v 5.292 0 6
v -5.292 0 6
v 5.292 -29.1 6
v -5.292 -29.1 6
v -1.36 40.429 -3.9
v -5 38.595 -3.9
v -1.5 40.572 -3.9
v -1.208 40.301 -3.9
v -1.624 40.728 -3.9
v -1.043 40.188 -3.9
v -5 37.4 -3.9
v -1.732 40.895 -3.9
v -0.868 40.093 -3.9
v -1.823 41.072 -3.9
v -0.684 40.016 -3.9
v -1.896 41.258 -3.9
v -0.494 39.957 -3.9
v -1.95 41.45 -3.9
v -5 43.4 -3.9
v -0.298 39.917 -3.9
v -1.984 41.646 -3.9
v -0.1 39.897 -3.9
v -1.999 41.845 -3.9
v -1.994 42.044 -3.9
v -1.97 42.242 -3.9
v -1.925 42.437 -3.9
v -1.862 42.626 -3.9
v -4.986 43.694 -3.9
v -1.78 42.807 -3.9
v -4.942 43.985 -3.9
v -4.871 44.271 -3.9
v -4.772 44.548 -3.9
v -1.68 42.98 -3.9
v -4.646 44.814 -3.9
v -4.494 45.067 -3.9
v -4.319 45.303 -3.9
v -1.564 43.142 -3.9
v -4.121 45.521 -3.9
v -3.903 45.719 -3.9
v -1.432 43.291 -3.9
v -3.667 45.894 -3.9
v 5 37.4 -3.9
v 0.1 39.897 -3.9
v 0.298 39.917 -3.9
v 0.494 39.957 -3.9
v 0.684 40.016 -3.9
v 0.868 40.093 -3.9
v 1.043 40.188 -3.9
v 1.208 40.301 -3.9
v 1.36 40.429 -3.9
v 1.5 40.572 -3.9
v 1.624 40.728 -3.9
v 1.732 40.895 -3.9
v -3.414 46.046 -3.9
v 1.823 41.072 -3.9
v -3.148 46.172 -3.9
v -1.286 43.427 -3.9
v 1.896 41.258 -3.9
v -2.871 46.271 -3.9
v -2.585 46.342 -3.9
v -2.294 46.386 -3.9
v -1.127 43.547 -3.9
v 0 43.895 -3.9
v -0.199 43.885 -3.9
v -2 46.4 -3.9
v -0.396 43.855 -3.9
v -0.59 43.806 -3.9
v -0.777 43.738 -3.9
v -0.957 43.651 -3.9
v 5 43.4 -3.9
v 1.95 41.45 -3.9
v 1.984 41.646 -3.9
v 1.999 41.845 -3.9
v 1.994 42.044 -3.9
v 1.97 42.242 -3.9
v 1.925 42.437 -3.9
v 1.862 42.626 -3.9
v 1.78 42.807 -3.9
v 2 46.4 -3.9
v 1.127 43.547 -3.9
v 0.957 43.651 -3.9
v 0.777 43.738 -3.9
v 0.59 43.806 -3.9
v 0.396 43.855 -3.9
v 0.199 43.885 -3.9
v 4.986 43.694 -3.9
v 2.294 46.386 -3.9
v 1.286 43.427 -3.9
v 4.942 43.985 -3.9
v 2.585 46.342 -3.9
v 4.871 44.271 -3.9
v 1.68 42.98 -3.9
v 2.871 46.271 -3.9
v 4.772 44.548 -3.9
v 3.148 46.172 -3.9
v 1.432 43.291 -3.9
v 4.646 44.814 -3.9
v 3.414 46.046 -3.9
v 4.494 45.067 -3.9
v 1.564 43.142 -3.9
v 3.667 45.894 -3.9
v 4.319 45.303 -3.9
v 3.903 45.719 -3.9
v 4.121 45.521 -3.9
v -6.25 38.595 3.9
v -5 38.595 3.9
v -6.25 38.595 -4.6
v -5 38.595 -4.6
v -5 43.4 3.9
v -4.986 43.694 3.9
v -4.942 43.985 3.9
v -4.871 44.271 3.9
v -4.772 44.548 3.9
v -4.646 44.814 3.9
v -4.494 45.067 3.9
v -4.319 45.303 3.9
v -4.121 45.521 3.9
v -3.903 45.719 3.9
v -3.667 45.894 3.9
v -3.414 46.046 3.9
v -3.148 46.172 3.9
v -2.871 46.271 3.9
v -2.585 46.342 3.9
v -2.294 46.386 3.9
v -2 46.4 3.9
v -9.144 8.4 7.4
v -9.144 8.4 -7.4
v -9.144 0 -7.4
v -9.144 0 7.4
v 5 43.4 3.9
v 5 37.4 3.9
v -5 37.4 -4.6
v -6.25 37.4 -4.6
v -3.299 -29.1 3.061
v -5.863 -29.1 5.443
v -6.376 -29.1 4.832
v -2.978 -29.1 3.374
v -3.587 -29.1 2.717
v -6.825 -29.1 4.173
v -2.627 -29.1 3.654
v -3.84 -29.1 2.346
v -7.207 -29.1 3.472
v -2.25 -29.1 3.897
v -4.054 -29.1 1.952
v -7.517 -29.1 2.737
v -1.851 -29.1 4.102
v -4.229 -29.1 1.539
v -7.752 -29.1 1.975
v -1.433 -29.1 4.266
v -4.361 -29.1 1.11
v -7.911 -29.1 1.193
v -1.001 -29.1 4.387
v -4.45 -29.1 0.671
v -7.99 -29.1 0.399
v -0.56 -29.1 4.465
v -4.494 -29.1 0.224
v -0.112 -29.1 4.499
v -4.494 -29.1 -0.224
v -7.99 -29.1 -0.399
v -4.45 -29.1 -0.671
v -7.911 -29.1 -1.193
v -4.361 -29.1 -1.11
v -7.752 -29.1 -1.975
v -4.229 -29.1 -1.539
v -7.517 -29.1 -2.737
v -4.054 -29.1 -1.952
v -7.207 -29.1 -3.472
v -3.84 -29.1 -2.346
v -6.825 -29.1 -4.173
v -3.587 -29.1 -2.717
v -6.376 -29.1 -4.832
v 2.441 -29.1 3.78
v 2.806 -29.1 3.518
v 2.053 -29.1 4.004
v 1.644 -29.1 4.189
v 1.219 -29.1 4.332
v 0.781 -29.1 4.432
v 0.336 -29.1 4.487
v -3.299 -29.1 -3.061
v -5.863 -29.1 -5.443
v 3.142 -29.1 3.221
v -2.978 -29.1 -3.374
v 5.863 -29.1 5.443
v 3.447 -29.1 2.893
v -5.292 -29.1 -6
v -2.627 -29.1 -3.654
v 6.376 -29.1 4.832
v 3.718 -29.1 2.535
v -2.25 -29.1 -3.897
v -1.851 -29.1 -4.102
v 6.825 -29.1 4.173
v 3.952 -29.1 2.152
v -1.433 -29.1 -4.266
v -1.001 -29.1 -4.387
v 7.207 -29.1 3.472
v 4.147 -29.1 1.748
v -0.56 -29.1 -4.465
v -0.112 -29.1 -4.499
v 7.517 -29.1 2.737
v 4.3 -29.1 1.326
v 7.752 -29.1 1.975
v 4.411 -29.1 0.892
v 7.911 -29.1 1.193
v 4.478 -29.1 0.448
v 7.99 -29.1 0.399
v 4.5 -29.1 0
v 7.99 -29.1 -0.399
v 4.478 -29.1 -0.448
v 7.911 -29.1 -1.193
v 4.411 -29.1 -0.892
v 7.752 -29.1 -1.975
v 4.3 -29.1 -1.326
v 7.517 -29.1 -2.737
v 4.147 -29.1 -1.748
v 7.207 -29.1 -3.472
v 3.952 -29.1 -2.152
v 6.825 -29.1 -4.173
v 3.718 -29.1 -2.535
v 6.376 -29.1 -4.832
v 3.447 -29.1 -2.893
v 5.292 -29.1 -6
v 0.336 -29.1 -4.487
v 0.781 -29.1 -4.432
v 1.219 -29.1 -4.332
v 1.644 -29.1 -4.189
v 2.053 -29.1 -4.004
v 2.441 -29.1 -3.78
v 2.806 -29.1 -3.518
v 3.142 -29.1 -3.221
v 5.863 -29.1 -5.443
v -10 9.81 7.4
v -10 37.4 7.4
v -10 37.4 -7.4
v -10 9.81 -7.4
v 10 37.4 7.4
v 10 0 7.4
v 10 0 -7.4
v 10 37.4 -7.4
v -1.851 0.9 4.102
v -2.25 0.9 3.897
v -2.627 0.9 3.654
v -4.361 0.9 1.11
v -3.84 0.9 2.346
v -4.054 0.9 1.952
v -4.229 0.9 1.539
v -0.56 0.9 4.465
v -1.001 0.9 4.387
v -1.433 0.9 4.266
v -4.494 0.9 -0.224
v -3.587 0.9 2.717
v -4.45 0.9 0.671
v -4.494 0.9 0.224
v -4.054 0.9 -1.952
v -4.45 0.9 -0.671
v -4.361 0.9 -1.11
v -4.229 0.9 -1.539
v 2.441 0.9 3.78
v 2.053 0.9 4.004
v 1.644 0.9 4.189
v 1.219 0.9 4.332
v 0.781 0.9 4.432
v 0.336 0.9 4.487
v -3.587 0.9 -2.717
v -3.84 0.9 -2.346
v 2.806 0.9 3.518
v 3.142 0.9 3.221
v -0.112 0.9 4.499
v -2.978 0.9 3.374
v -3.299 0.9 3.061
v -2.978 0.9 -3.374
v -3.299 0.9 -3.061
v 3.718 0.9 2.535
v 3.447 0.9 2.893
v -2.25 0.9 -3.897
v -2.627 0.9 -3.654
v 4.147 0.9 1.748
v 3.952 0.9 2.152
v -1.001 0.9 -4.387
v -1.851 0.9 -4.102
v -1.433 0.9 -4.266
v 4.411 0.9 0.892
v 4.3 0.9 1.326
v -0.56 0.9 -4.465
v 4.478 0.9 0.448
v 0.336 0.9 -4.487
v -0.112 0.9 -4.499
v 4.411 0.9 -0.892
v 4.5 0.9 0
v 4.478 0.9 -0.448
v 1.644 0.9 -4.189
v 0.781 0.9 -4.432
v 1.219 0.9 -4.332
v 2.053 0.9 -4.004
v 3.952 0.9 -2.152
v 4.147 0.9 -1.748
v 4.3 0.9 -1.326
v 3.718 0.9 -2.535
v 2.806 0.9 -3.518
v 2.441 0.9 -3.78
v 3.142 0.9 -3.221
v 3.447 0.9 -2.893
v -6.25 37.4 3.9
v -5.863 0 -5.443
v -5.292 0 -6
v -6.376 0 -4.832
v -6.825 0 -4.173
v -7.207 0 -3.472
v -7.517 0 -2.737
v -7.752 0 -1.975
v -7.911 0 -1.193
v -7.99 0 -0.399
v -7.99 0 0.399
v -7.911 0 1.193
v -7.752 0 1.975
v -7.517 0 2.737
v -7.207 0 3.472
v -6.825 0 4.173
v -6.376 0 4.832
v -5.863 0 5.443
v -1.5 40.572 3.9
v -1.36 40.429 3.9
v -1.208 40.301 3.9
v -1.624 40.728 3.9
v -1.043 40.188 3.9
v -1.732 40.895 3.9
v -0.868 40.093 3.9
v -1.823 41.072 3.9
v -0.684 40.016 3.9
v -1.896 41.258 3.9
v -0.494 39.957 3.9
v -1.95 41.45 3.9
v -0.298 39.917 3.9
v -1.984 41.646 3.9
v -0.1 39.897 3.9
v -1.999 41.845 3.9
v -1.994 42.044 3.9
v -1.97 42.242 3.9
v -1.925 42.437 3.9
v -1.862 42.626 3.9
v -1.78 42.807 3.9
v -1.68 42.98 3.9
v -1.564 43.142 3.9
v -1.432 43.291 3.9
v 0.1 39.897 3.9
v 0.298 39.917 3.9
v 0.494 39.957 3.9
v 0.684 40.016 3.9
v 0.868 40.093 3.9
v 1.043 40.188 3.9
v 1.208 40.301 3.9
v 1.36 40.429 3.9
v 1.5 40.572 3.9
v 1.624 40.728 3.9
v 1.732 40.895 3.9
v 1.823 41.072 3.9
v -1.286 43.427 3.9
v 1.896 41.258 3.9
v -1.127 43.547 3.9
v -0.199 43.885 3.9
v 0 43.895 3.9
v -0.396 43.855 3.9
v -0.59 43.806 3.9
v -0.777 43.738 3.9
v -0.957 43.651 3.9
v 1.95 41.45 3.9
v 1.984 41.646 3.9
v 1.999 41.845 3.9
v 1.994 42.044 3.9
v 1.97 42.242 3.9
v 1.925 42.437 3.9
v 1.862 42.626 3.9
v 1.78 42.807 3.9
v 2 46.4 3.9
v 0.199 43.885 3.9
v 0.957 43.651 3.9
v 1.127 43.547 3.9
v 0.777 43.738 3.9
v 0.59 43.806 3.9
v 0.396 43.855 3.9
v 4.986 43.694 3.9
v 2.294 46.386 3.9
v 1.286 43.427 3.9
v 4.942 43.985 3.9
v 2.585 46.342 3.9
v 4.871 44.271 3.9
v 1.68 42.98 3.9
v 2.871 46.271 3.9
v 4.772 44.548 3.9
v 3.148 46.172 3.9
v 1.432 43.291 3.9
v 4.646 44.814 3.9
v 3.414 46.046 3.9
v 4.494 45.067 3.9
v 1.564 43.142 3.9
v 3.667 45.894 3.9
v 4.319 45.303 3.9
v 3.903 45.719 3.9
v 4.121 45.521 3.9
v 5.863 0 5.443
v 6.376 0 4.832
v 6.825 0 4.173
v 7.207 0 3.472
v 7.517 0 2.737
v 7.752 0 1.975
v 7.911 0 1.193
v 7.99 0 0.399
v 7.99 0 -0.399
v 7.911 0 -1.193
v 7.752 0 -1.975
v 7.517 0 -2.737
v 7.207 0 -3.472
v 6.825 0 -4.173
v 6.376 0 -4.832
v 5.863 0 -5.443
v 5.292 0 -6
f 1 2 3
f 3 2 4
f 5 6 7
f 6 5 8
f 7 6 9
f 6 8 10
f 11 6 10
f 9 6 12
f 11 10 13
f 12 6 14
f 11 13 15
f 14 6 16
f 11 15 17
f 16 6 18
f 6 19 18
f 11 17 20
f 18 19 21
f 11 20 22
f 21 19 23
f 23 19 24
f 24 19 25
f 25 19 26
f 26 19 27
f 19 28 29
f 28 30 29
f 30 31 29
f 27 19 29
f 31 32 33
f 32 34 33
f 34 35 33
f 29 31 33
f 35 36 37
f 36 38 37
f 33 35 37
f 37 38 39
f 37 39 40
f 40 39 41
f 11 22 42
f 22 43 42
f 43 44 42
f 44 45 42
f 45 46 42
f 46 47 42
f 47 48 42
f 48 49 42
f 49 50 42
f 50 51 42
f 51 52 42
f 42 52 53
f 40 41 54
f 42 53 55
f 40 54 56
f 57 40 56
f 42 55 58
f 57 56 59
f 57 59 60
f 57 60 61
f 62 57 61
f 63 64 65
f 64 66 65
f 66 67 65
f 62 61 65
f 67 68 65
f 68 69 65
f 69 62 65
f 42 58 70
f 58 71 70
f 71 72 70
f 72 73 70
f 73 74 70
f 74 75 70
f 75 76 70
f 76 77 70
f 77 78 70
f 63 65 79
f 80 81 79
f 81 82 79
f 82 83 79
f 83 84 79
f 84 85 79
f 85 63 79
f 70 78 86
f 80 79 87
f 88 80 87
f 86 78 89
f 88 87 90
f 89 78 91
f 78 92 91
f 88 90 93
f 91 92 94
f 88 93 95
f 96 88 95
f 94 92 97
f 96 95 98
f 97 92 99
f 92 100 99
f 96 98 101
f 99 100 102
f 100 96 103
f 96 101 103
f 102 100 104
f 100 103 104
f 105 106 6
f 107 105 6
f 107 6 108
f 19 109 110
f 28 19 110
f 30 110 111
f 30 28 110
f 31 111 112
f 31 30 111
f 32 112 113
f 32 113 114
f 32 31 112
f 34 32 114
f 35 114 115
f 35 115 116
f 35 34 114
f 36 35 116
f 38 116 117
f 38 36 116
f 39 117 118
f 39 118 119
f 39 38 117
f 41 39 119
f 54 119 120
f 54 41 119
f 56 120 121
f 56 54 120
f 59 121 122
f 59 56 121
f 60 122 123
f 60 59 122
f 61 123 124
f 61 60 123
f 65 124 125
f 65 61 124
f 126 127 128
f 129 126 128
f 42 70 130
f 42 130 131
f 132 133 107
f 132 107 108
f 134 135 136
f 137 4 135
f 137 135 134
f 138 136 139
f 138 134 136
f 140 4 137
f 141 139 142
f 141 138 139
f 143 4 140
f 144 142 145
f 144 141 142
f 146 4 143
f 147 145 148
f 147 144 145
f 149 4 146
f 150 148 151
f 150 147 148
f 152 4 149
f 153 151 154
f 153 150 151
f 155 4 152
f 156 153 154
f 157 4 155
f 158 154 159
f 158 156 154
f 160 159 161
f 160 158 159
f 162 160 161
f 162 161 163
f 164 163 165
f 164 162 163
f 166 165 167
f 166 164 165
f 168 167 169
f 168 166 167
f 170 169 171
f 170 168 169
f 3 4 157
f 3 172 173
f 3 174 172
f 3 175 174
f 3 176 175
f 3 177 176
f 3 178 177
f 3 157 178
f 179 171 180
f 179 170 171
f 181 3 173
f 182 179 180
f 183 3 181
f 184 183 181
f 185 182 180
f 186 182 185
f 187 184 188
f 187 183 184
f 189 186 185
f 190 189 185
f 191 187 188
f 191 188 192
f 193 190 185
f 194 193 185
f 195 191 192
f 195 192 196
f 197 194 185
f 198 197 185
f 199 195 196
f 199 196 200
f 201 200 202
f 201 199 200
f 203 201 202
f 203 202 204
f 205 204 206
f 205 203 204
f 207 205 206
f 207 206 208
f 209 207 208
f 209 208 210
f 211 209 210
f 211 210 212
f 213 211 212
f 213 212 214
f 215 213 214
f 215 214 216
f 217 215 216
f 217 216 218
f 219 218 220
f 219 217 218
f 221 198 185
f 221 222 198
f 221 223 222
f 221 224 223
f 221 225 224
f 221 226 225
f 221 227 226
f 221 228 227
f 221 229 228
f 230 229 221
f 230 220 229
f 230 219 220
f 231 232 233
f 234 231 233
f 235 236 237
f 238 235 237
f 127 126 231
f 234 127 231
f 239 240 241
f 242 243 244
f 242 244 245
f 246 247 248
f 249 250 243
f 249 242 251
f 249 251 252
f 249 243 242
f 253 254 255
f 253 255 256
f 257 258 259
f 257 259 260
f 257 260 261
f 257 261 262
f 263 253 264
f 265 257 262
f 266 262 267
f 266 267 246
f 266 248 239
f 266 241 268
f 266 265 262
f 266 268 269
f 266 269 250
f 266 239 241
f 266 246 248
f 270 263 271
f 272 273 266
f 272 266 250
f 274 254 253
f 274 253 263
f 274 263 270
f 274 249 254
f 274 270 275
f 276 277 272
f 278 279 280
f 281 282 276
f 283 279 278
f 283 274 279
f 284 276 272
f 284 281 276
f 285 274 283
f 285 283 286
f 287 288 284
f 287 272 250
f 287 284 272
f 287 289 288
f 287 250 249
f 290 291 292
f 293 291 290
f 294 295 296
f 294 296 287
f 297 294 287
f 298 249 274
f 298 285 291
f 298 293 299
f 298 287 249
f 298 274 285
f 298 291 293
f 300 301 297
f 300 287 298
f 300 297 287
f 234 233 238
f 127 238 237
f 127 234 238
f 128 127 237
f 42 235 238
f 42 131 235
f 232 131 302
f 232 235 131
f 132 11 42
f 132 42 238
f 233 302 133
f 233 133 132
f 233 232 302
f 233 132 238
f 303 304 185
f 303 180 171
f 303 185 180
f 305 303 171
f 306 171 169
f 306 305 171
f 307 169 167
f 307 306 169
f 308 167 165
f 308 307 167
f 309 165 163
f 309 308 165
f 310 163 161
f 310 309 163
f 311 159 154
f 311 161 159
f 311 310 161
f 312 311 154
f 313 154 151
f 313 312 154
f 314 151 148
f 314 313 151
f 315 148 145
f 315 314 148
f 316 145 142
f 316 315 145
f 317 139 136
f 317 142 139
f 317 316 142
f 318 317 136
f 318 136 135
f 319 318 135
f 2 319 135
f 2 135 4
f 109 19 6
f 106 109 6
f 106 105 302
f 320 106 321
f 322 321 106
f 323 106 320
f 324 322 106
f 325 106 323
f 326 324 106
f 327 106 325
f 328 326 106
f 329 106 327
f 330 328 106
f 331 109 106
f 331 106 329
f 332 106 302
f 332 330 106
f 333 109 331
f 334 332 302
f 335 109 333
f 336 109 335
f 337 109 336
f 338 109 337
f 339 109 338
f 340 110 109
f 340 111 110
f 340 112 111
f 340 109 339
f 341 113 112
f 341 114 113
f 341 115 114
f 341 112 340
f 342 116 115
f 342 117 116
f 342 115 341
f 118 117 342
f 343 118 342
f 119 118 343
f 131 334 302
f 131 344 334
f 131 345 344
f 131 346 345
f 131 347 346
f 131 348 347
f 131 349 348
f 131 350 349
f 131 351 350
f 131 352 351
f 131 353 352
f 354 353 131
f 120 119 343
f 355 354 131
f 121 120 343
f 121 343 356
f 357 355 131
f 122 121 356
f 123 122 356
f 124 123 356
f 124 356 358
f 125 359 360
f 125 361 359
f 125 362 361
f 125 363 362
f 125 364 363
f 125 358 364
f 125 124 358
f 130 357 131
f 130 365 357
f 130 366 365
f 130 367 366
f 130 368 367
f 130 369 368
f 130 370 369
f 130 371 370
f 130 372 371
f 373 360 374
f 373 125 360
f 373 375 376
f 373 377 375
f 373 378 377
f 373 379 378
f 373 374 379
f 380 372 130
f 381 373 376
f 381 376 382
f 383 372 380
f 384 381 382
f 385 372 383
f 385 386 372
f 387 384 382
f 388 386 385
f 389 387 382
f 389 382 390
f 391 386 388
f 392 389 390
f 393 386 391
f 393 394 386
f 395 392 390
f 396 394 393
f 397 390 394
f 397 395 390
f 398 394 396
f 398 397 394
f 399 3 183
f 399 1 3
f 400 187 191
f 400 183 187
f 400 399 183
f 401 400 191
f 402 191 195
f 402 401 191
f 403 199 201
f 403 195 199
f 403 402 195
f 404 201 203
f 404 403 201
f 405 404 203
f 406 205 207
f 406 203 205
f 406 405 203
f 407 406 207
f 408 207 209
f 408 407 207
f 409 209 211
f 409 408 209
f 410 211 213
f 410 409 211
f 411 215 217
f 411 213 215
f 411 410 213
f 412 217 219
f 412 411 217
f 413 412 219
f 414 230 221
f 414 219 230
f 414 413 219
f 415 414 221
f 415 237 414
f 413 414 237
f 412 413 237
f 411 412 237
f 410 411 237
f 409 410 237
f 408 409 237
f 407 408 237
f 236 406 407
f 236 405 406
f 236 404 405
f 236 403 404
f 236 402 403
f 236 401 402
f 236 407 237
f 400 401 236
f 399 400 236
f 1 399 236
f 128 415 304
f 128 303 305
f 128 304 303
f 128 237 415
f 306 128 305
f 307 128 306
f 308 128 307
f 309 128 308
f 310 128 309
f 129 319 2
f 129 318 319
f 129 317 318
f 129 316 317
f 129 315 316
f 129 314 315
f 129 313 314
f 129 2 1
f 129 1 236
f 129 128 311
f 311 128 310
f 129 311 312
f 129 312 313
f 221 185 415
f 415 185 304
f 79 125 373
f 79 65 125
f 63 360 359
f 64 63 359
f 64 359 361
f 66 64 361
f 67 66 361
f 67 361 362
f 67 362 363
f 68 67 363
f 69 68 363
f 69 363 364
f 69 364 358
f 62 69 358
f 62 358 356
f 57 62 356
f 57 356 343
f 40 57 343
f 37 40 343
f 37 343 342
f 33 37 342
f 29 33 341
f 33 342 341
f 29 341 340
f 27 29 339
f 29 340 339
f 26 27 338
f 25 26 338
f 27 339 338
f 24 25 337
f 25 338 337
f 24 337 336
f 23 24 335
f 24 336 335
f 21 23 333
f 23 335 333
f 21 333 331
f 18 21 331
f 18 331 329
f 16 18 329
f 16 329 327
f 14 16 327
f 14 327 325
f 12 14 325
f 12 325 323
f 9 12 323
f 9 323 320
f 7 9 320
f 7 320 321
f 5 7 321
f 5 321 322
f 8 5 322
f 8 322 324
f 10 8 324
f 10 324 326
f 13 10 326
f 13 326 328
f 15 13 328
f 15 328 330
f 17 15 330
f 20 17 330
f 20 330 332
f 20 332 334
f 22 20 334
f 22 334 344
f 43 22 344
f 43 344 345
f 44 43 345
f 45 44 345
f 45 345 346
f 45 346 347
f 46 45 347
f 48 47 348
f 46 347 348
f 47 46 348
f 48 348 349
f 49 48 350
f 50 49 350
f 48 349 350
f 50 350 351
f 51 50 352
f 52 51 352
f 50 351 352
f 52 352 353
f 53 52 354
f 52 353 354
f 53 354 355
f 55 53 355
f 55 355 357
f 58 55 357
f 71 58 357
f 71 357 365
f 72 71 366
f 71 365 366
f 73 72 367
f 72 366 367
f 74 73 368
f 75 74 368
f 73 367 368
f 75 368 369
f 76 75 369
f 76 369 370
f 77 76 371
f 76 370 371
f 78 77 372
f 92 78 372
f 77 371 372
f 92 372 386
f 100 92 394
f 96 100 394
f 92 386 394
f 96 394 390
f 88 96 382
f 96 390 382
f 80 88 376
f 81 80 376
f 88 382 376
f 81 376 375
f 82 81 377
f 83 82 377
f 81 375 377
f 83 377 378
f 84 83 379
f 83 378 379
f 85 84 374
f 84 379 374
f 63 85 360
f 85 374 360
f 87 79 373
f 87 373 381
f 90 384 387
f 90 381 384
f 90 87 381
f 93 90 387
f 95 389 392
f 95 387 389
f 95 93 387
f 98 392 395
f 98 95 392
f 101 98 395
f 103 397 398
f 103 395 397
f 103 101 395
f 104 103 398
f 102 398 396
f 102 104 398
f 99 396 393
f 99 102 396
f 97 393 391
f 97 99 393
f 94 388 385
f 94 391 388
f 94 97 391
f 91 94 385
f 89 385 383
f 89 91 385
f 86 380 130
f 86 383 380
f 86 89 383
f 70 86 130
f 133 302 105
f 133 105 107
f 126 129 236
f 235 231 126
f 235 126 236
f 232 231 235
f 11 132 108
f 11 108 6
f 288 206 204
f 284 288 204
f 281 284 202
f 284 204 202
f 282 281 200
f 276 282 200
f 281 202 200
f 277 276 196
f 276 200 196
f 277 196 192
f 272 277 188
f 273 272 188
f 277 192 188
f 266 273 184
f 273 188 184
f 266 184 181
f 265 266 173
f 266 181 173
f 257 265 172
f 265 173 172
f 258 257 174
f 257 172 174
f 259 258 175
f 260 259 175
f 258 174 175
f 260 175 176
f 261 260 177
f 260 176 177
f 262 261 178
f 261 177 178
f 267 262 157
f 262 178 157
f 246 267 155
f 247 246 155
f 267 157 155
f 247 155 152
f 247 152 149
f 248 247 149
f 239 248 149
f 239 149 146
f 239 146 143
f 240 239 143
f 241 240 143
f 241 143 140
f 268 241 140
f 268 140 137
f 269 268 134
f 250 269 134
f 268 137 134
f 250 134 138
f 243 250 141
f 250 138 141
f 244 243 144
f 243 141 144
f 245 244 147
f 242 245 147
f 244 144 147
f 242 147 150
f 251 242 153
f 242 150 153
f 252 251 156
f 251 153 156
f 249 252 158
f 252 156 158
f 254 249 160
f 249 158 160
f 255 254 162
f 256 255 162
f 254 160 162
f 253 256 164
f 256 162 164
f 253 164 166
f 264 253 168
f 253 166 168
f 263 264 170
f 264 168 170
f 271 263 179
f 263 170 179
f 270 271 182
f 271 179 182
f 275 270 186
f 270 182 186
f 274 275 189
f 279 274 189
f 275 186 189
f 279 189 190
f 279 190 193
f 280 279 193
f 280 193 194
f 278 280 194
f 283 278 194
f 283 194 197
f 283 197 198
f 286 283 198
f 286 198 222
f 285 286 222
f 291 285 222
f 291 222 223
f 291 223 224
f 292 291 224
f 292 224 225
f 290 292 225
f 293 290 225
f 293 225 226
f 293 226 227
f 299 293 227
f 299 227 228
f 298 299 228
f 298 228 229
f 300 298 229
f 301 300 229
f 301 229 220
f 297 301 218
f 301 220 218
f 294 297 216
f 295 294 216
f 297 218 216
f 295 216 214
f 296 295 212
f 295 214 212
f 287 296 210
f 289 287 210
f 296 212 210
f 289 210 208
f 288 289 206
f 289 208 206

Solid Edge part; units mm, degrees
sketch "Sketch1" plane through (0, 0, 0) normal (1, 0, 0) x (0, 1, 0)
  line L0 (0, 7.4) -> (37.4, 7.4)
  line L1 (37.4, 7.4) -> (37.4, -7.4)
  line L2 (37.4, -7.4) -> (0, -7.4)
  line L3 (0, -7.4) -> (0, 7.4)
  dimension "D1" = 37.4
  dimension "D2" = 14.8
extrude "Protrusion1" add sketch "Sketch1" along normal mid plane 20
sketch "Sketch2" plane through (0, 0, 0) normal (0, 0, 1) x (1, 0, 0)
  line L0 (-5, 37.4) -> (-5, 46.4)
  line L1 (-5, 46.4) -> (5, 46.4)
  line L2 (5, 37.4) -> (5, 46.4)
  dimension "D1" = 10
  dimension "D2" = 5
  dimension "D3" = 46.4
extrude "Extrusionsausprägung_2" add sketch "Sketch2" along normal mid plane 7.8 material side at (-4.95, 41.9, 0)
fillet "Verrundung_1" radius 3 2 edges at (5, 46.4, 0) (-5, 46.4, 0)
sketch "Sketch3" plane through (0, 37.4, 0) normal (0, 1, 0) x (0, 0, -1)
  line L0 (-3.9, 5) -> (-3.9, 6.25)
  line L1 (-3.9, 6.25) -> (4.6, 6.25)
  line L2 (4.6, 6.25) -> (4.6, 5)
  line L3 (4.6, 5) -> (-3.9, 5)
  dimension "D1" = 1.25
  dimension "D2" = 8.5
extrude "Extrusionsausprägung_3" add sketch "Sketch3" along normal mid plane 2.39
sketch "Sketch4" plane through (-0.625, 41.9, 3.9) normal (0, 0, 1) x (0, 1, 0)
  circle A0 centre (-0.005, -0.625) radius 2
  dimension "D1" = 3.3
extrude "Cutout1" cut sketch "Sketch4" along normal mid plane 36
sketch "Sketch5" plane through (0, 18.7, 7.4) normal (0, 0, 1) x (0, 1, 0)
  line L0 (-18.7, 9.1438) -> (-10.3, 9.1438)
  line L1 (-10.3, 9.1438) -> (-8.8895, 10)
  dimension "D1" = 29
extrude "Extrusionsausschnitt_2" cut sketch "Sketch5" along normal mid plane 87 material side at (-9.1938, 4.2, 7.4)
sketch "Sketch6" plane through (0.4281, 0, 0) normal (0, -1, 0) x (0, 0, 1)
  circle A0 centre (0, 0.4281) radius 8
extrude "Extrusionsausprägung_4" add sketch "Sketch6" along normal blind 29.1
sketch "Sketch7" plane through (10, 18.7, 0) normal (1, 0, 0) x (0, 1, 0)
  line L0 (-55.4467, 6) -> (-18.7, 6)
  line L1 (-18.7, 6) -> (-18.7, 10.4583)
extrude "Extrusionsausschnitt_3" cut sketch "Sketch7" along normal mid plane 52 material side at (10, -18.3734, 6.05)
mirror "Mirror1" about plane through (0, 0, 0) normal (0, 0, 1) of "Extrusionsausschnitt_3"
sketch "Sketch8" plane through (0, -29.1, 0) normal (0, -1, 0) x (1, 0, 0)
  circle A0 centre (0, 0) radius 4.5
  dimension "D1" = 9
extrude "Extrusionsausschnitt_5" cut sketch "Sketch8" against normal blind 30
